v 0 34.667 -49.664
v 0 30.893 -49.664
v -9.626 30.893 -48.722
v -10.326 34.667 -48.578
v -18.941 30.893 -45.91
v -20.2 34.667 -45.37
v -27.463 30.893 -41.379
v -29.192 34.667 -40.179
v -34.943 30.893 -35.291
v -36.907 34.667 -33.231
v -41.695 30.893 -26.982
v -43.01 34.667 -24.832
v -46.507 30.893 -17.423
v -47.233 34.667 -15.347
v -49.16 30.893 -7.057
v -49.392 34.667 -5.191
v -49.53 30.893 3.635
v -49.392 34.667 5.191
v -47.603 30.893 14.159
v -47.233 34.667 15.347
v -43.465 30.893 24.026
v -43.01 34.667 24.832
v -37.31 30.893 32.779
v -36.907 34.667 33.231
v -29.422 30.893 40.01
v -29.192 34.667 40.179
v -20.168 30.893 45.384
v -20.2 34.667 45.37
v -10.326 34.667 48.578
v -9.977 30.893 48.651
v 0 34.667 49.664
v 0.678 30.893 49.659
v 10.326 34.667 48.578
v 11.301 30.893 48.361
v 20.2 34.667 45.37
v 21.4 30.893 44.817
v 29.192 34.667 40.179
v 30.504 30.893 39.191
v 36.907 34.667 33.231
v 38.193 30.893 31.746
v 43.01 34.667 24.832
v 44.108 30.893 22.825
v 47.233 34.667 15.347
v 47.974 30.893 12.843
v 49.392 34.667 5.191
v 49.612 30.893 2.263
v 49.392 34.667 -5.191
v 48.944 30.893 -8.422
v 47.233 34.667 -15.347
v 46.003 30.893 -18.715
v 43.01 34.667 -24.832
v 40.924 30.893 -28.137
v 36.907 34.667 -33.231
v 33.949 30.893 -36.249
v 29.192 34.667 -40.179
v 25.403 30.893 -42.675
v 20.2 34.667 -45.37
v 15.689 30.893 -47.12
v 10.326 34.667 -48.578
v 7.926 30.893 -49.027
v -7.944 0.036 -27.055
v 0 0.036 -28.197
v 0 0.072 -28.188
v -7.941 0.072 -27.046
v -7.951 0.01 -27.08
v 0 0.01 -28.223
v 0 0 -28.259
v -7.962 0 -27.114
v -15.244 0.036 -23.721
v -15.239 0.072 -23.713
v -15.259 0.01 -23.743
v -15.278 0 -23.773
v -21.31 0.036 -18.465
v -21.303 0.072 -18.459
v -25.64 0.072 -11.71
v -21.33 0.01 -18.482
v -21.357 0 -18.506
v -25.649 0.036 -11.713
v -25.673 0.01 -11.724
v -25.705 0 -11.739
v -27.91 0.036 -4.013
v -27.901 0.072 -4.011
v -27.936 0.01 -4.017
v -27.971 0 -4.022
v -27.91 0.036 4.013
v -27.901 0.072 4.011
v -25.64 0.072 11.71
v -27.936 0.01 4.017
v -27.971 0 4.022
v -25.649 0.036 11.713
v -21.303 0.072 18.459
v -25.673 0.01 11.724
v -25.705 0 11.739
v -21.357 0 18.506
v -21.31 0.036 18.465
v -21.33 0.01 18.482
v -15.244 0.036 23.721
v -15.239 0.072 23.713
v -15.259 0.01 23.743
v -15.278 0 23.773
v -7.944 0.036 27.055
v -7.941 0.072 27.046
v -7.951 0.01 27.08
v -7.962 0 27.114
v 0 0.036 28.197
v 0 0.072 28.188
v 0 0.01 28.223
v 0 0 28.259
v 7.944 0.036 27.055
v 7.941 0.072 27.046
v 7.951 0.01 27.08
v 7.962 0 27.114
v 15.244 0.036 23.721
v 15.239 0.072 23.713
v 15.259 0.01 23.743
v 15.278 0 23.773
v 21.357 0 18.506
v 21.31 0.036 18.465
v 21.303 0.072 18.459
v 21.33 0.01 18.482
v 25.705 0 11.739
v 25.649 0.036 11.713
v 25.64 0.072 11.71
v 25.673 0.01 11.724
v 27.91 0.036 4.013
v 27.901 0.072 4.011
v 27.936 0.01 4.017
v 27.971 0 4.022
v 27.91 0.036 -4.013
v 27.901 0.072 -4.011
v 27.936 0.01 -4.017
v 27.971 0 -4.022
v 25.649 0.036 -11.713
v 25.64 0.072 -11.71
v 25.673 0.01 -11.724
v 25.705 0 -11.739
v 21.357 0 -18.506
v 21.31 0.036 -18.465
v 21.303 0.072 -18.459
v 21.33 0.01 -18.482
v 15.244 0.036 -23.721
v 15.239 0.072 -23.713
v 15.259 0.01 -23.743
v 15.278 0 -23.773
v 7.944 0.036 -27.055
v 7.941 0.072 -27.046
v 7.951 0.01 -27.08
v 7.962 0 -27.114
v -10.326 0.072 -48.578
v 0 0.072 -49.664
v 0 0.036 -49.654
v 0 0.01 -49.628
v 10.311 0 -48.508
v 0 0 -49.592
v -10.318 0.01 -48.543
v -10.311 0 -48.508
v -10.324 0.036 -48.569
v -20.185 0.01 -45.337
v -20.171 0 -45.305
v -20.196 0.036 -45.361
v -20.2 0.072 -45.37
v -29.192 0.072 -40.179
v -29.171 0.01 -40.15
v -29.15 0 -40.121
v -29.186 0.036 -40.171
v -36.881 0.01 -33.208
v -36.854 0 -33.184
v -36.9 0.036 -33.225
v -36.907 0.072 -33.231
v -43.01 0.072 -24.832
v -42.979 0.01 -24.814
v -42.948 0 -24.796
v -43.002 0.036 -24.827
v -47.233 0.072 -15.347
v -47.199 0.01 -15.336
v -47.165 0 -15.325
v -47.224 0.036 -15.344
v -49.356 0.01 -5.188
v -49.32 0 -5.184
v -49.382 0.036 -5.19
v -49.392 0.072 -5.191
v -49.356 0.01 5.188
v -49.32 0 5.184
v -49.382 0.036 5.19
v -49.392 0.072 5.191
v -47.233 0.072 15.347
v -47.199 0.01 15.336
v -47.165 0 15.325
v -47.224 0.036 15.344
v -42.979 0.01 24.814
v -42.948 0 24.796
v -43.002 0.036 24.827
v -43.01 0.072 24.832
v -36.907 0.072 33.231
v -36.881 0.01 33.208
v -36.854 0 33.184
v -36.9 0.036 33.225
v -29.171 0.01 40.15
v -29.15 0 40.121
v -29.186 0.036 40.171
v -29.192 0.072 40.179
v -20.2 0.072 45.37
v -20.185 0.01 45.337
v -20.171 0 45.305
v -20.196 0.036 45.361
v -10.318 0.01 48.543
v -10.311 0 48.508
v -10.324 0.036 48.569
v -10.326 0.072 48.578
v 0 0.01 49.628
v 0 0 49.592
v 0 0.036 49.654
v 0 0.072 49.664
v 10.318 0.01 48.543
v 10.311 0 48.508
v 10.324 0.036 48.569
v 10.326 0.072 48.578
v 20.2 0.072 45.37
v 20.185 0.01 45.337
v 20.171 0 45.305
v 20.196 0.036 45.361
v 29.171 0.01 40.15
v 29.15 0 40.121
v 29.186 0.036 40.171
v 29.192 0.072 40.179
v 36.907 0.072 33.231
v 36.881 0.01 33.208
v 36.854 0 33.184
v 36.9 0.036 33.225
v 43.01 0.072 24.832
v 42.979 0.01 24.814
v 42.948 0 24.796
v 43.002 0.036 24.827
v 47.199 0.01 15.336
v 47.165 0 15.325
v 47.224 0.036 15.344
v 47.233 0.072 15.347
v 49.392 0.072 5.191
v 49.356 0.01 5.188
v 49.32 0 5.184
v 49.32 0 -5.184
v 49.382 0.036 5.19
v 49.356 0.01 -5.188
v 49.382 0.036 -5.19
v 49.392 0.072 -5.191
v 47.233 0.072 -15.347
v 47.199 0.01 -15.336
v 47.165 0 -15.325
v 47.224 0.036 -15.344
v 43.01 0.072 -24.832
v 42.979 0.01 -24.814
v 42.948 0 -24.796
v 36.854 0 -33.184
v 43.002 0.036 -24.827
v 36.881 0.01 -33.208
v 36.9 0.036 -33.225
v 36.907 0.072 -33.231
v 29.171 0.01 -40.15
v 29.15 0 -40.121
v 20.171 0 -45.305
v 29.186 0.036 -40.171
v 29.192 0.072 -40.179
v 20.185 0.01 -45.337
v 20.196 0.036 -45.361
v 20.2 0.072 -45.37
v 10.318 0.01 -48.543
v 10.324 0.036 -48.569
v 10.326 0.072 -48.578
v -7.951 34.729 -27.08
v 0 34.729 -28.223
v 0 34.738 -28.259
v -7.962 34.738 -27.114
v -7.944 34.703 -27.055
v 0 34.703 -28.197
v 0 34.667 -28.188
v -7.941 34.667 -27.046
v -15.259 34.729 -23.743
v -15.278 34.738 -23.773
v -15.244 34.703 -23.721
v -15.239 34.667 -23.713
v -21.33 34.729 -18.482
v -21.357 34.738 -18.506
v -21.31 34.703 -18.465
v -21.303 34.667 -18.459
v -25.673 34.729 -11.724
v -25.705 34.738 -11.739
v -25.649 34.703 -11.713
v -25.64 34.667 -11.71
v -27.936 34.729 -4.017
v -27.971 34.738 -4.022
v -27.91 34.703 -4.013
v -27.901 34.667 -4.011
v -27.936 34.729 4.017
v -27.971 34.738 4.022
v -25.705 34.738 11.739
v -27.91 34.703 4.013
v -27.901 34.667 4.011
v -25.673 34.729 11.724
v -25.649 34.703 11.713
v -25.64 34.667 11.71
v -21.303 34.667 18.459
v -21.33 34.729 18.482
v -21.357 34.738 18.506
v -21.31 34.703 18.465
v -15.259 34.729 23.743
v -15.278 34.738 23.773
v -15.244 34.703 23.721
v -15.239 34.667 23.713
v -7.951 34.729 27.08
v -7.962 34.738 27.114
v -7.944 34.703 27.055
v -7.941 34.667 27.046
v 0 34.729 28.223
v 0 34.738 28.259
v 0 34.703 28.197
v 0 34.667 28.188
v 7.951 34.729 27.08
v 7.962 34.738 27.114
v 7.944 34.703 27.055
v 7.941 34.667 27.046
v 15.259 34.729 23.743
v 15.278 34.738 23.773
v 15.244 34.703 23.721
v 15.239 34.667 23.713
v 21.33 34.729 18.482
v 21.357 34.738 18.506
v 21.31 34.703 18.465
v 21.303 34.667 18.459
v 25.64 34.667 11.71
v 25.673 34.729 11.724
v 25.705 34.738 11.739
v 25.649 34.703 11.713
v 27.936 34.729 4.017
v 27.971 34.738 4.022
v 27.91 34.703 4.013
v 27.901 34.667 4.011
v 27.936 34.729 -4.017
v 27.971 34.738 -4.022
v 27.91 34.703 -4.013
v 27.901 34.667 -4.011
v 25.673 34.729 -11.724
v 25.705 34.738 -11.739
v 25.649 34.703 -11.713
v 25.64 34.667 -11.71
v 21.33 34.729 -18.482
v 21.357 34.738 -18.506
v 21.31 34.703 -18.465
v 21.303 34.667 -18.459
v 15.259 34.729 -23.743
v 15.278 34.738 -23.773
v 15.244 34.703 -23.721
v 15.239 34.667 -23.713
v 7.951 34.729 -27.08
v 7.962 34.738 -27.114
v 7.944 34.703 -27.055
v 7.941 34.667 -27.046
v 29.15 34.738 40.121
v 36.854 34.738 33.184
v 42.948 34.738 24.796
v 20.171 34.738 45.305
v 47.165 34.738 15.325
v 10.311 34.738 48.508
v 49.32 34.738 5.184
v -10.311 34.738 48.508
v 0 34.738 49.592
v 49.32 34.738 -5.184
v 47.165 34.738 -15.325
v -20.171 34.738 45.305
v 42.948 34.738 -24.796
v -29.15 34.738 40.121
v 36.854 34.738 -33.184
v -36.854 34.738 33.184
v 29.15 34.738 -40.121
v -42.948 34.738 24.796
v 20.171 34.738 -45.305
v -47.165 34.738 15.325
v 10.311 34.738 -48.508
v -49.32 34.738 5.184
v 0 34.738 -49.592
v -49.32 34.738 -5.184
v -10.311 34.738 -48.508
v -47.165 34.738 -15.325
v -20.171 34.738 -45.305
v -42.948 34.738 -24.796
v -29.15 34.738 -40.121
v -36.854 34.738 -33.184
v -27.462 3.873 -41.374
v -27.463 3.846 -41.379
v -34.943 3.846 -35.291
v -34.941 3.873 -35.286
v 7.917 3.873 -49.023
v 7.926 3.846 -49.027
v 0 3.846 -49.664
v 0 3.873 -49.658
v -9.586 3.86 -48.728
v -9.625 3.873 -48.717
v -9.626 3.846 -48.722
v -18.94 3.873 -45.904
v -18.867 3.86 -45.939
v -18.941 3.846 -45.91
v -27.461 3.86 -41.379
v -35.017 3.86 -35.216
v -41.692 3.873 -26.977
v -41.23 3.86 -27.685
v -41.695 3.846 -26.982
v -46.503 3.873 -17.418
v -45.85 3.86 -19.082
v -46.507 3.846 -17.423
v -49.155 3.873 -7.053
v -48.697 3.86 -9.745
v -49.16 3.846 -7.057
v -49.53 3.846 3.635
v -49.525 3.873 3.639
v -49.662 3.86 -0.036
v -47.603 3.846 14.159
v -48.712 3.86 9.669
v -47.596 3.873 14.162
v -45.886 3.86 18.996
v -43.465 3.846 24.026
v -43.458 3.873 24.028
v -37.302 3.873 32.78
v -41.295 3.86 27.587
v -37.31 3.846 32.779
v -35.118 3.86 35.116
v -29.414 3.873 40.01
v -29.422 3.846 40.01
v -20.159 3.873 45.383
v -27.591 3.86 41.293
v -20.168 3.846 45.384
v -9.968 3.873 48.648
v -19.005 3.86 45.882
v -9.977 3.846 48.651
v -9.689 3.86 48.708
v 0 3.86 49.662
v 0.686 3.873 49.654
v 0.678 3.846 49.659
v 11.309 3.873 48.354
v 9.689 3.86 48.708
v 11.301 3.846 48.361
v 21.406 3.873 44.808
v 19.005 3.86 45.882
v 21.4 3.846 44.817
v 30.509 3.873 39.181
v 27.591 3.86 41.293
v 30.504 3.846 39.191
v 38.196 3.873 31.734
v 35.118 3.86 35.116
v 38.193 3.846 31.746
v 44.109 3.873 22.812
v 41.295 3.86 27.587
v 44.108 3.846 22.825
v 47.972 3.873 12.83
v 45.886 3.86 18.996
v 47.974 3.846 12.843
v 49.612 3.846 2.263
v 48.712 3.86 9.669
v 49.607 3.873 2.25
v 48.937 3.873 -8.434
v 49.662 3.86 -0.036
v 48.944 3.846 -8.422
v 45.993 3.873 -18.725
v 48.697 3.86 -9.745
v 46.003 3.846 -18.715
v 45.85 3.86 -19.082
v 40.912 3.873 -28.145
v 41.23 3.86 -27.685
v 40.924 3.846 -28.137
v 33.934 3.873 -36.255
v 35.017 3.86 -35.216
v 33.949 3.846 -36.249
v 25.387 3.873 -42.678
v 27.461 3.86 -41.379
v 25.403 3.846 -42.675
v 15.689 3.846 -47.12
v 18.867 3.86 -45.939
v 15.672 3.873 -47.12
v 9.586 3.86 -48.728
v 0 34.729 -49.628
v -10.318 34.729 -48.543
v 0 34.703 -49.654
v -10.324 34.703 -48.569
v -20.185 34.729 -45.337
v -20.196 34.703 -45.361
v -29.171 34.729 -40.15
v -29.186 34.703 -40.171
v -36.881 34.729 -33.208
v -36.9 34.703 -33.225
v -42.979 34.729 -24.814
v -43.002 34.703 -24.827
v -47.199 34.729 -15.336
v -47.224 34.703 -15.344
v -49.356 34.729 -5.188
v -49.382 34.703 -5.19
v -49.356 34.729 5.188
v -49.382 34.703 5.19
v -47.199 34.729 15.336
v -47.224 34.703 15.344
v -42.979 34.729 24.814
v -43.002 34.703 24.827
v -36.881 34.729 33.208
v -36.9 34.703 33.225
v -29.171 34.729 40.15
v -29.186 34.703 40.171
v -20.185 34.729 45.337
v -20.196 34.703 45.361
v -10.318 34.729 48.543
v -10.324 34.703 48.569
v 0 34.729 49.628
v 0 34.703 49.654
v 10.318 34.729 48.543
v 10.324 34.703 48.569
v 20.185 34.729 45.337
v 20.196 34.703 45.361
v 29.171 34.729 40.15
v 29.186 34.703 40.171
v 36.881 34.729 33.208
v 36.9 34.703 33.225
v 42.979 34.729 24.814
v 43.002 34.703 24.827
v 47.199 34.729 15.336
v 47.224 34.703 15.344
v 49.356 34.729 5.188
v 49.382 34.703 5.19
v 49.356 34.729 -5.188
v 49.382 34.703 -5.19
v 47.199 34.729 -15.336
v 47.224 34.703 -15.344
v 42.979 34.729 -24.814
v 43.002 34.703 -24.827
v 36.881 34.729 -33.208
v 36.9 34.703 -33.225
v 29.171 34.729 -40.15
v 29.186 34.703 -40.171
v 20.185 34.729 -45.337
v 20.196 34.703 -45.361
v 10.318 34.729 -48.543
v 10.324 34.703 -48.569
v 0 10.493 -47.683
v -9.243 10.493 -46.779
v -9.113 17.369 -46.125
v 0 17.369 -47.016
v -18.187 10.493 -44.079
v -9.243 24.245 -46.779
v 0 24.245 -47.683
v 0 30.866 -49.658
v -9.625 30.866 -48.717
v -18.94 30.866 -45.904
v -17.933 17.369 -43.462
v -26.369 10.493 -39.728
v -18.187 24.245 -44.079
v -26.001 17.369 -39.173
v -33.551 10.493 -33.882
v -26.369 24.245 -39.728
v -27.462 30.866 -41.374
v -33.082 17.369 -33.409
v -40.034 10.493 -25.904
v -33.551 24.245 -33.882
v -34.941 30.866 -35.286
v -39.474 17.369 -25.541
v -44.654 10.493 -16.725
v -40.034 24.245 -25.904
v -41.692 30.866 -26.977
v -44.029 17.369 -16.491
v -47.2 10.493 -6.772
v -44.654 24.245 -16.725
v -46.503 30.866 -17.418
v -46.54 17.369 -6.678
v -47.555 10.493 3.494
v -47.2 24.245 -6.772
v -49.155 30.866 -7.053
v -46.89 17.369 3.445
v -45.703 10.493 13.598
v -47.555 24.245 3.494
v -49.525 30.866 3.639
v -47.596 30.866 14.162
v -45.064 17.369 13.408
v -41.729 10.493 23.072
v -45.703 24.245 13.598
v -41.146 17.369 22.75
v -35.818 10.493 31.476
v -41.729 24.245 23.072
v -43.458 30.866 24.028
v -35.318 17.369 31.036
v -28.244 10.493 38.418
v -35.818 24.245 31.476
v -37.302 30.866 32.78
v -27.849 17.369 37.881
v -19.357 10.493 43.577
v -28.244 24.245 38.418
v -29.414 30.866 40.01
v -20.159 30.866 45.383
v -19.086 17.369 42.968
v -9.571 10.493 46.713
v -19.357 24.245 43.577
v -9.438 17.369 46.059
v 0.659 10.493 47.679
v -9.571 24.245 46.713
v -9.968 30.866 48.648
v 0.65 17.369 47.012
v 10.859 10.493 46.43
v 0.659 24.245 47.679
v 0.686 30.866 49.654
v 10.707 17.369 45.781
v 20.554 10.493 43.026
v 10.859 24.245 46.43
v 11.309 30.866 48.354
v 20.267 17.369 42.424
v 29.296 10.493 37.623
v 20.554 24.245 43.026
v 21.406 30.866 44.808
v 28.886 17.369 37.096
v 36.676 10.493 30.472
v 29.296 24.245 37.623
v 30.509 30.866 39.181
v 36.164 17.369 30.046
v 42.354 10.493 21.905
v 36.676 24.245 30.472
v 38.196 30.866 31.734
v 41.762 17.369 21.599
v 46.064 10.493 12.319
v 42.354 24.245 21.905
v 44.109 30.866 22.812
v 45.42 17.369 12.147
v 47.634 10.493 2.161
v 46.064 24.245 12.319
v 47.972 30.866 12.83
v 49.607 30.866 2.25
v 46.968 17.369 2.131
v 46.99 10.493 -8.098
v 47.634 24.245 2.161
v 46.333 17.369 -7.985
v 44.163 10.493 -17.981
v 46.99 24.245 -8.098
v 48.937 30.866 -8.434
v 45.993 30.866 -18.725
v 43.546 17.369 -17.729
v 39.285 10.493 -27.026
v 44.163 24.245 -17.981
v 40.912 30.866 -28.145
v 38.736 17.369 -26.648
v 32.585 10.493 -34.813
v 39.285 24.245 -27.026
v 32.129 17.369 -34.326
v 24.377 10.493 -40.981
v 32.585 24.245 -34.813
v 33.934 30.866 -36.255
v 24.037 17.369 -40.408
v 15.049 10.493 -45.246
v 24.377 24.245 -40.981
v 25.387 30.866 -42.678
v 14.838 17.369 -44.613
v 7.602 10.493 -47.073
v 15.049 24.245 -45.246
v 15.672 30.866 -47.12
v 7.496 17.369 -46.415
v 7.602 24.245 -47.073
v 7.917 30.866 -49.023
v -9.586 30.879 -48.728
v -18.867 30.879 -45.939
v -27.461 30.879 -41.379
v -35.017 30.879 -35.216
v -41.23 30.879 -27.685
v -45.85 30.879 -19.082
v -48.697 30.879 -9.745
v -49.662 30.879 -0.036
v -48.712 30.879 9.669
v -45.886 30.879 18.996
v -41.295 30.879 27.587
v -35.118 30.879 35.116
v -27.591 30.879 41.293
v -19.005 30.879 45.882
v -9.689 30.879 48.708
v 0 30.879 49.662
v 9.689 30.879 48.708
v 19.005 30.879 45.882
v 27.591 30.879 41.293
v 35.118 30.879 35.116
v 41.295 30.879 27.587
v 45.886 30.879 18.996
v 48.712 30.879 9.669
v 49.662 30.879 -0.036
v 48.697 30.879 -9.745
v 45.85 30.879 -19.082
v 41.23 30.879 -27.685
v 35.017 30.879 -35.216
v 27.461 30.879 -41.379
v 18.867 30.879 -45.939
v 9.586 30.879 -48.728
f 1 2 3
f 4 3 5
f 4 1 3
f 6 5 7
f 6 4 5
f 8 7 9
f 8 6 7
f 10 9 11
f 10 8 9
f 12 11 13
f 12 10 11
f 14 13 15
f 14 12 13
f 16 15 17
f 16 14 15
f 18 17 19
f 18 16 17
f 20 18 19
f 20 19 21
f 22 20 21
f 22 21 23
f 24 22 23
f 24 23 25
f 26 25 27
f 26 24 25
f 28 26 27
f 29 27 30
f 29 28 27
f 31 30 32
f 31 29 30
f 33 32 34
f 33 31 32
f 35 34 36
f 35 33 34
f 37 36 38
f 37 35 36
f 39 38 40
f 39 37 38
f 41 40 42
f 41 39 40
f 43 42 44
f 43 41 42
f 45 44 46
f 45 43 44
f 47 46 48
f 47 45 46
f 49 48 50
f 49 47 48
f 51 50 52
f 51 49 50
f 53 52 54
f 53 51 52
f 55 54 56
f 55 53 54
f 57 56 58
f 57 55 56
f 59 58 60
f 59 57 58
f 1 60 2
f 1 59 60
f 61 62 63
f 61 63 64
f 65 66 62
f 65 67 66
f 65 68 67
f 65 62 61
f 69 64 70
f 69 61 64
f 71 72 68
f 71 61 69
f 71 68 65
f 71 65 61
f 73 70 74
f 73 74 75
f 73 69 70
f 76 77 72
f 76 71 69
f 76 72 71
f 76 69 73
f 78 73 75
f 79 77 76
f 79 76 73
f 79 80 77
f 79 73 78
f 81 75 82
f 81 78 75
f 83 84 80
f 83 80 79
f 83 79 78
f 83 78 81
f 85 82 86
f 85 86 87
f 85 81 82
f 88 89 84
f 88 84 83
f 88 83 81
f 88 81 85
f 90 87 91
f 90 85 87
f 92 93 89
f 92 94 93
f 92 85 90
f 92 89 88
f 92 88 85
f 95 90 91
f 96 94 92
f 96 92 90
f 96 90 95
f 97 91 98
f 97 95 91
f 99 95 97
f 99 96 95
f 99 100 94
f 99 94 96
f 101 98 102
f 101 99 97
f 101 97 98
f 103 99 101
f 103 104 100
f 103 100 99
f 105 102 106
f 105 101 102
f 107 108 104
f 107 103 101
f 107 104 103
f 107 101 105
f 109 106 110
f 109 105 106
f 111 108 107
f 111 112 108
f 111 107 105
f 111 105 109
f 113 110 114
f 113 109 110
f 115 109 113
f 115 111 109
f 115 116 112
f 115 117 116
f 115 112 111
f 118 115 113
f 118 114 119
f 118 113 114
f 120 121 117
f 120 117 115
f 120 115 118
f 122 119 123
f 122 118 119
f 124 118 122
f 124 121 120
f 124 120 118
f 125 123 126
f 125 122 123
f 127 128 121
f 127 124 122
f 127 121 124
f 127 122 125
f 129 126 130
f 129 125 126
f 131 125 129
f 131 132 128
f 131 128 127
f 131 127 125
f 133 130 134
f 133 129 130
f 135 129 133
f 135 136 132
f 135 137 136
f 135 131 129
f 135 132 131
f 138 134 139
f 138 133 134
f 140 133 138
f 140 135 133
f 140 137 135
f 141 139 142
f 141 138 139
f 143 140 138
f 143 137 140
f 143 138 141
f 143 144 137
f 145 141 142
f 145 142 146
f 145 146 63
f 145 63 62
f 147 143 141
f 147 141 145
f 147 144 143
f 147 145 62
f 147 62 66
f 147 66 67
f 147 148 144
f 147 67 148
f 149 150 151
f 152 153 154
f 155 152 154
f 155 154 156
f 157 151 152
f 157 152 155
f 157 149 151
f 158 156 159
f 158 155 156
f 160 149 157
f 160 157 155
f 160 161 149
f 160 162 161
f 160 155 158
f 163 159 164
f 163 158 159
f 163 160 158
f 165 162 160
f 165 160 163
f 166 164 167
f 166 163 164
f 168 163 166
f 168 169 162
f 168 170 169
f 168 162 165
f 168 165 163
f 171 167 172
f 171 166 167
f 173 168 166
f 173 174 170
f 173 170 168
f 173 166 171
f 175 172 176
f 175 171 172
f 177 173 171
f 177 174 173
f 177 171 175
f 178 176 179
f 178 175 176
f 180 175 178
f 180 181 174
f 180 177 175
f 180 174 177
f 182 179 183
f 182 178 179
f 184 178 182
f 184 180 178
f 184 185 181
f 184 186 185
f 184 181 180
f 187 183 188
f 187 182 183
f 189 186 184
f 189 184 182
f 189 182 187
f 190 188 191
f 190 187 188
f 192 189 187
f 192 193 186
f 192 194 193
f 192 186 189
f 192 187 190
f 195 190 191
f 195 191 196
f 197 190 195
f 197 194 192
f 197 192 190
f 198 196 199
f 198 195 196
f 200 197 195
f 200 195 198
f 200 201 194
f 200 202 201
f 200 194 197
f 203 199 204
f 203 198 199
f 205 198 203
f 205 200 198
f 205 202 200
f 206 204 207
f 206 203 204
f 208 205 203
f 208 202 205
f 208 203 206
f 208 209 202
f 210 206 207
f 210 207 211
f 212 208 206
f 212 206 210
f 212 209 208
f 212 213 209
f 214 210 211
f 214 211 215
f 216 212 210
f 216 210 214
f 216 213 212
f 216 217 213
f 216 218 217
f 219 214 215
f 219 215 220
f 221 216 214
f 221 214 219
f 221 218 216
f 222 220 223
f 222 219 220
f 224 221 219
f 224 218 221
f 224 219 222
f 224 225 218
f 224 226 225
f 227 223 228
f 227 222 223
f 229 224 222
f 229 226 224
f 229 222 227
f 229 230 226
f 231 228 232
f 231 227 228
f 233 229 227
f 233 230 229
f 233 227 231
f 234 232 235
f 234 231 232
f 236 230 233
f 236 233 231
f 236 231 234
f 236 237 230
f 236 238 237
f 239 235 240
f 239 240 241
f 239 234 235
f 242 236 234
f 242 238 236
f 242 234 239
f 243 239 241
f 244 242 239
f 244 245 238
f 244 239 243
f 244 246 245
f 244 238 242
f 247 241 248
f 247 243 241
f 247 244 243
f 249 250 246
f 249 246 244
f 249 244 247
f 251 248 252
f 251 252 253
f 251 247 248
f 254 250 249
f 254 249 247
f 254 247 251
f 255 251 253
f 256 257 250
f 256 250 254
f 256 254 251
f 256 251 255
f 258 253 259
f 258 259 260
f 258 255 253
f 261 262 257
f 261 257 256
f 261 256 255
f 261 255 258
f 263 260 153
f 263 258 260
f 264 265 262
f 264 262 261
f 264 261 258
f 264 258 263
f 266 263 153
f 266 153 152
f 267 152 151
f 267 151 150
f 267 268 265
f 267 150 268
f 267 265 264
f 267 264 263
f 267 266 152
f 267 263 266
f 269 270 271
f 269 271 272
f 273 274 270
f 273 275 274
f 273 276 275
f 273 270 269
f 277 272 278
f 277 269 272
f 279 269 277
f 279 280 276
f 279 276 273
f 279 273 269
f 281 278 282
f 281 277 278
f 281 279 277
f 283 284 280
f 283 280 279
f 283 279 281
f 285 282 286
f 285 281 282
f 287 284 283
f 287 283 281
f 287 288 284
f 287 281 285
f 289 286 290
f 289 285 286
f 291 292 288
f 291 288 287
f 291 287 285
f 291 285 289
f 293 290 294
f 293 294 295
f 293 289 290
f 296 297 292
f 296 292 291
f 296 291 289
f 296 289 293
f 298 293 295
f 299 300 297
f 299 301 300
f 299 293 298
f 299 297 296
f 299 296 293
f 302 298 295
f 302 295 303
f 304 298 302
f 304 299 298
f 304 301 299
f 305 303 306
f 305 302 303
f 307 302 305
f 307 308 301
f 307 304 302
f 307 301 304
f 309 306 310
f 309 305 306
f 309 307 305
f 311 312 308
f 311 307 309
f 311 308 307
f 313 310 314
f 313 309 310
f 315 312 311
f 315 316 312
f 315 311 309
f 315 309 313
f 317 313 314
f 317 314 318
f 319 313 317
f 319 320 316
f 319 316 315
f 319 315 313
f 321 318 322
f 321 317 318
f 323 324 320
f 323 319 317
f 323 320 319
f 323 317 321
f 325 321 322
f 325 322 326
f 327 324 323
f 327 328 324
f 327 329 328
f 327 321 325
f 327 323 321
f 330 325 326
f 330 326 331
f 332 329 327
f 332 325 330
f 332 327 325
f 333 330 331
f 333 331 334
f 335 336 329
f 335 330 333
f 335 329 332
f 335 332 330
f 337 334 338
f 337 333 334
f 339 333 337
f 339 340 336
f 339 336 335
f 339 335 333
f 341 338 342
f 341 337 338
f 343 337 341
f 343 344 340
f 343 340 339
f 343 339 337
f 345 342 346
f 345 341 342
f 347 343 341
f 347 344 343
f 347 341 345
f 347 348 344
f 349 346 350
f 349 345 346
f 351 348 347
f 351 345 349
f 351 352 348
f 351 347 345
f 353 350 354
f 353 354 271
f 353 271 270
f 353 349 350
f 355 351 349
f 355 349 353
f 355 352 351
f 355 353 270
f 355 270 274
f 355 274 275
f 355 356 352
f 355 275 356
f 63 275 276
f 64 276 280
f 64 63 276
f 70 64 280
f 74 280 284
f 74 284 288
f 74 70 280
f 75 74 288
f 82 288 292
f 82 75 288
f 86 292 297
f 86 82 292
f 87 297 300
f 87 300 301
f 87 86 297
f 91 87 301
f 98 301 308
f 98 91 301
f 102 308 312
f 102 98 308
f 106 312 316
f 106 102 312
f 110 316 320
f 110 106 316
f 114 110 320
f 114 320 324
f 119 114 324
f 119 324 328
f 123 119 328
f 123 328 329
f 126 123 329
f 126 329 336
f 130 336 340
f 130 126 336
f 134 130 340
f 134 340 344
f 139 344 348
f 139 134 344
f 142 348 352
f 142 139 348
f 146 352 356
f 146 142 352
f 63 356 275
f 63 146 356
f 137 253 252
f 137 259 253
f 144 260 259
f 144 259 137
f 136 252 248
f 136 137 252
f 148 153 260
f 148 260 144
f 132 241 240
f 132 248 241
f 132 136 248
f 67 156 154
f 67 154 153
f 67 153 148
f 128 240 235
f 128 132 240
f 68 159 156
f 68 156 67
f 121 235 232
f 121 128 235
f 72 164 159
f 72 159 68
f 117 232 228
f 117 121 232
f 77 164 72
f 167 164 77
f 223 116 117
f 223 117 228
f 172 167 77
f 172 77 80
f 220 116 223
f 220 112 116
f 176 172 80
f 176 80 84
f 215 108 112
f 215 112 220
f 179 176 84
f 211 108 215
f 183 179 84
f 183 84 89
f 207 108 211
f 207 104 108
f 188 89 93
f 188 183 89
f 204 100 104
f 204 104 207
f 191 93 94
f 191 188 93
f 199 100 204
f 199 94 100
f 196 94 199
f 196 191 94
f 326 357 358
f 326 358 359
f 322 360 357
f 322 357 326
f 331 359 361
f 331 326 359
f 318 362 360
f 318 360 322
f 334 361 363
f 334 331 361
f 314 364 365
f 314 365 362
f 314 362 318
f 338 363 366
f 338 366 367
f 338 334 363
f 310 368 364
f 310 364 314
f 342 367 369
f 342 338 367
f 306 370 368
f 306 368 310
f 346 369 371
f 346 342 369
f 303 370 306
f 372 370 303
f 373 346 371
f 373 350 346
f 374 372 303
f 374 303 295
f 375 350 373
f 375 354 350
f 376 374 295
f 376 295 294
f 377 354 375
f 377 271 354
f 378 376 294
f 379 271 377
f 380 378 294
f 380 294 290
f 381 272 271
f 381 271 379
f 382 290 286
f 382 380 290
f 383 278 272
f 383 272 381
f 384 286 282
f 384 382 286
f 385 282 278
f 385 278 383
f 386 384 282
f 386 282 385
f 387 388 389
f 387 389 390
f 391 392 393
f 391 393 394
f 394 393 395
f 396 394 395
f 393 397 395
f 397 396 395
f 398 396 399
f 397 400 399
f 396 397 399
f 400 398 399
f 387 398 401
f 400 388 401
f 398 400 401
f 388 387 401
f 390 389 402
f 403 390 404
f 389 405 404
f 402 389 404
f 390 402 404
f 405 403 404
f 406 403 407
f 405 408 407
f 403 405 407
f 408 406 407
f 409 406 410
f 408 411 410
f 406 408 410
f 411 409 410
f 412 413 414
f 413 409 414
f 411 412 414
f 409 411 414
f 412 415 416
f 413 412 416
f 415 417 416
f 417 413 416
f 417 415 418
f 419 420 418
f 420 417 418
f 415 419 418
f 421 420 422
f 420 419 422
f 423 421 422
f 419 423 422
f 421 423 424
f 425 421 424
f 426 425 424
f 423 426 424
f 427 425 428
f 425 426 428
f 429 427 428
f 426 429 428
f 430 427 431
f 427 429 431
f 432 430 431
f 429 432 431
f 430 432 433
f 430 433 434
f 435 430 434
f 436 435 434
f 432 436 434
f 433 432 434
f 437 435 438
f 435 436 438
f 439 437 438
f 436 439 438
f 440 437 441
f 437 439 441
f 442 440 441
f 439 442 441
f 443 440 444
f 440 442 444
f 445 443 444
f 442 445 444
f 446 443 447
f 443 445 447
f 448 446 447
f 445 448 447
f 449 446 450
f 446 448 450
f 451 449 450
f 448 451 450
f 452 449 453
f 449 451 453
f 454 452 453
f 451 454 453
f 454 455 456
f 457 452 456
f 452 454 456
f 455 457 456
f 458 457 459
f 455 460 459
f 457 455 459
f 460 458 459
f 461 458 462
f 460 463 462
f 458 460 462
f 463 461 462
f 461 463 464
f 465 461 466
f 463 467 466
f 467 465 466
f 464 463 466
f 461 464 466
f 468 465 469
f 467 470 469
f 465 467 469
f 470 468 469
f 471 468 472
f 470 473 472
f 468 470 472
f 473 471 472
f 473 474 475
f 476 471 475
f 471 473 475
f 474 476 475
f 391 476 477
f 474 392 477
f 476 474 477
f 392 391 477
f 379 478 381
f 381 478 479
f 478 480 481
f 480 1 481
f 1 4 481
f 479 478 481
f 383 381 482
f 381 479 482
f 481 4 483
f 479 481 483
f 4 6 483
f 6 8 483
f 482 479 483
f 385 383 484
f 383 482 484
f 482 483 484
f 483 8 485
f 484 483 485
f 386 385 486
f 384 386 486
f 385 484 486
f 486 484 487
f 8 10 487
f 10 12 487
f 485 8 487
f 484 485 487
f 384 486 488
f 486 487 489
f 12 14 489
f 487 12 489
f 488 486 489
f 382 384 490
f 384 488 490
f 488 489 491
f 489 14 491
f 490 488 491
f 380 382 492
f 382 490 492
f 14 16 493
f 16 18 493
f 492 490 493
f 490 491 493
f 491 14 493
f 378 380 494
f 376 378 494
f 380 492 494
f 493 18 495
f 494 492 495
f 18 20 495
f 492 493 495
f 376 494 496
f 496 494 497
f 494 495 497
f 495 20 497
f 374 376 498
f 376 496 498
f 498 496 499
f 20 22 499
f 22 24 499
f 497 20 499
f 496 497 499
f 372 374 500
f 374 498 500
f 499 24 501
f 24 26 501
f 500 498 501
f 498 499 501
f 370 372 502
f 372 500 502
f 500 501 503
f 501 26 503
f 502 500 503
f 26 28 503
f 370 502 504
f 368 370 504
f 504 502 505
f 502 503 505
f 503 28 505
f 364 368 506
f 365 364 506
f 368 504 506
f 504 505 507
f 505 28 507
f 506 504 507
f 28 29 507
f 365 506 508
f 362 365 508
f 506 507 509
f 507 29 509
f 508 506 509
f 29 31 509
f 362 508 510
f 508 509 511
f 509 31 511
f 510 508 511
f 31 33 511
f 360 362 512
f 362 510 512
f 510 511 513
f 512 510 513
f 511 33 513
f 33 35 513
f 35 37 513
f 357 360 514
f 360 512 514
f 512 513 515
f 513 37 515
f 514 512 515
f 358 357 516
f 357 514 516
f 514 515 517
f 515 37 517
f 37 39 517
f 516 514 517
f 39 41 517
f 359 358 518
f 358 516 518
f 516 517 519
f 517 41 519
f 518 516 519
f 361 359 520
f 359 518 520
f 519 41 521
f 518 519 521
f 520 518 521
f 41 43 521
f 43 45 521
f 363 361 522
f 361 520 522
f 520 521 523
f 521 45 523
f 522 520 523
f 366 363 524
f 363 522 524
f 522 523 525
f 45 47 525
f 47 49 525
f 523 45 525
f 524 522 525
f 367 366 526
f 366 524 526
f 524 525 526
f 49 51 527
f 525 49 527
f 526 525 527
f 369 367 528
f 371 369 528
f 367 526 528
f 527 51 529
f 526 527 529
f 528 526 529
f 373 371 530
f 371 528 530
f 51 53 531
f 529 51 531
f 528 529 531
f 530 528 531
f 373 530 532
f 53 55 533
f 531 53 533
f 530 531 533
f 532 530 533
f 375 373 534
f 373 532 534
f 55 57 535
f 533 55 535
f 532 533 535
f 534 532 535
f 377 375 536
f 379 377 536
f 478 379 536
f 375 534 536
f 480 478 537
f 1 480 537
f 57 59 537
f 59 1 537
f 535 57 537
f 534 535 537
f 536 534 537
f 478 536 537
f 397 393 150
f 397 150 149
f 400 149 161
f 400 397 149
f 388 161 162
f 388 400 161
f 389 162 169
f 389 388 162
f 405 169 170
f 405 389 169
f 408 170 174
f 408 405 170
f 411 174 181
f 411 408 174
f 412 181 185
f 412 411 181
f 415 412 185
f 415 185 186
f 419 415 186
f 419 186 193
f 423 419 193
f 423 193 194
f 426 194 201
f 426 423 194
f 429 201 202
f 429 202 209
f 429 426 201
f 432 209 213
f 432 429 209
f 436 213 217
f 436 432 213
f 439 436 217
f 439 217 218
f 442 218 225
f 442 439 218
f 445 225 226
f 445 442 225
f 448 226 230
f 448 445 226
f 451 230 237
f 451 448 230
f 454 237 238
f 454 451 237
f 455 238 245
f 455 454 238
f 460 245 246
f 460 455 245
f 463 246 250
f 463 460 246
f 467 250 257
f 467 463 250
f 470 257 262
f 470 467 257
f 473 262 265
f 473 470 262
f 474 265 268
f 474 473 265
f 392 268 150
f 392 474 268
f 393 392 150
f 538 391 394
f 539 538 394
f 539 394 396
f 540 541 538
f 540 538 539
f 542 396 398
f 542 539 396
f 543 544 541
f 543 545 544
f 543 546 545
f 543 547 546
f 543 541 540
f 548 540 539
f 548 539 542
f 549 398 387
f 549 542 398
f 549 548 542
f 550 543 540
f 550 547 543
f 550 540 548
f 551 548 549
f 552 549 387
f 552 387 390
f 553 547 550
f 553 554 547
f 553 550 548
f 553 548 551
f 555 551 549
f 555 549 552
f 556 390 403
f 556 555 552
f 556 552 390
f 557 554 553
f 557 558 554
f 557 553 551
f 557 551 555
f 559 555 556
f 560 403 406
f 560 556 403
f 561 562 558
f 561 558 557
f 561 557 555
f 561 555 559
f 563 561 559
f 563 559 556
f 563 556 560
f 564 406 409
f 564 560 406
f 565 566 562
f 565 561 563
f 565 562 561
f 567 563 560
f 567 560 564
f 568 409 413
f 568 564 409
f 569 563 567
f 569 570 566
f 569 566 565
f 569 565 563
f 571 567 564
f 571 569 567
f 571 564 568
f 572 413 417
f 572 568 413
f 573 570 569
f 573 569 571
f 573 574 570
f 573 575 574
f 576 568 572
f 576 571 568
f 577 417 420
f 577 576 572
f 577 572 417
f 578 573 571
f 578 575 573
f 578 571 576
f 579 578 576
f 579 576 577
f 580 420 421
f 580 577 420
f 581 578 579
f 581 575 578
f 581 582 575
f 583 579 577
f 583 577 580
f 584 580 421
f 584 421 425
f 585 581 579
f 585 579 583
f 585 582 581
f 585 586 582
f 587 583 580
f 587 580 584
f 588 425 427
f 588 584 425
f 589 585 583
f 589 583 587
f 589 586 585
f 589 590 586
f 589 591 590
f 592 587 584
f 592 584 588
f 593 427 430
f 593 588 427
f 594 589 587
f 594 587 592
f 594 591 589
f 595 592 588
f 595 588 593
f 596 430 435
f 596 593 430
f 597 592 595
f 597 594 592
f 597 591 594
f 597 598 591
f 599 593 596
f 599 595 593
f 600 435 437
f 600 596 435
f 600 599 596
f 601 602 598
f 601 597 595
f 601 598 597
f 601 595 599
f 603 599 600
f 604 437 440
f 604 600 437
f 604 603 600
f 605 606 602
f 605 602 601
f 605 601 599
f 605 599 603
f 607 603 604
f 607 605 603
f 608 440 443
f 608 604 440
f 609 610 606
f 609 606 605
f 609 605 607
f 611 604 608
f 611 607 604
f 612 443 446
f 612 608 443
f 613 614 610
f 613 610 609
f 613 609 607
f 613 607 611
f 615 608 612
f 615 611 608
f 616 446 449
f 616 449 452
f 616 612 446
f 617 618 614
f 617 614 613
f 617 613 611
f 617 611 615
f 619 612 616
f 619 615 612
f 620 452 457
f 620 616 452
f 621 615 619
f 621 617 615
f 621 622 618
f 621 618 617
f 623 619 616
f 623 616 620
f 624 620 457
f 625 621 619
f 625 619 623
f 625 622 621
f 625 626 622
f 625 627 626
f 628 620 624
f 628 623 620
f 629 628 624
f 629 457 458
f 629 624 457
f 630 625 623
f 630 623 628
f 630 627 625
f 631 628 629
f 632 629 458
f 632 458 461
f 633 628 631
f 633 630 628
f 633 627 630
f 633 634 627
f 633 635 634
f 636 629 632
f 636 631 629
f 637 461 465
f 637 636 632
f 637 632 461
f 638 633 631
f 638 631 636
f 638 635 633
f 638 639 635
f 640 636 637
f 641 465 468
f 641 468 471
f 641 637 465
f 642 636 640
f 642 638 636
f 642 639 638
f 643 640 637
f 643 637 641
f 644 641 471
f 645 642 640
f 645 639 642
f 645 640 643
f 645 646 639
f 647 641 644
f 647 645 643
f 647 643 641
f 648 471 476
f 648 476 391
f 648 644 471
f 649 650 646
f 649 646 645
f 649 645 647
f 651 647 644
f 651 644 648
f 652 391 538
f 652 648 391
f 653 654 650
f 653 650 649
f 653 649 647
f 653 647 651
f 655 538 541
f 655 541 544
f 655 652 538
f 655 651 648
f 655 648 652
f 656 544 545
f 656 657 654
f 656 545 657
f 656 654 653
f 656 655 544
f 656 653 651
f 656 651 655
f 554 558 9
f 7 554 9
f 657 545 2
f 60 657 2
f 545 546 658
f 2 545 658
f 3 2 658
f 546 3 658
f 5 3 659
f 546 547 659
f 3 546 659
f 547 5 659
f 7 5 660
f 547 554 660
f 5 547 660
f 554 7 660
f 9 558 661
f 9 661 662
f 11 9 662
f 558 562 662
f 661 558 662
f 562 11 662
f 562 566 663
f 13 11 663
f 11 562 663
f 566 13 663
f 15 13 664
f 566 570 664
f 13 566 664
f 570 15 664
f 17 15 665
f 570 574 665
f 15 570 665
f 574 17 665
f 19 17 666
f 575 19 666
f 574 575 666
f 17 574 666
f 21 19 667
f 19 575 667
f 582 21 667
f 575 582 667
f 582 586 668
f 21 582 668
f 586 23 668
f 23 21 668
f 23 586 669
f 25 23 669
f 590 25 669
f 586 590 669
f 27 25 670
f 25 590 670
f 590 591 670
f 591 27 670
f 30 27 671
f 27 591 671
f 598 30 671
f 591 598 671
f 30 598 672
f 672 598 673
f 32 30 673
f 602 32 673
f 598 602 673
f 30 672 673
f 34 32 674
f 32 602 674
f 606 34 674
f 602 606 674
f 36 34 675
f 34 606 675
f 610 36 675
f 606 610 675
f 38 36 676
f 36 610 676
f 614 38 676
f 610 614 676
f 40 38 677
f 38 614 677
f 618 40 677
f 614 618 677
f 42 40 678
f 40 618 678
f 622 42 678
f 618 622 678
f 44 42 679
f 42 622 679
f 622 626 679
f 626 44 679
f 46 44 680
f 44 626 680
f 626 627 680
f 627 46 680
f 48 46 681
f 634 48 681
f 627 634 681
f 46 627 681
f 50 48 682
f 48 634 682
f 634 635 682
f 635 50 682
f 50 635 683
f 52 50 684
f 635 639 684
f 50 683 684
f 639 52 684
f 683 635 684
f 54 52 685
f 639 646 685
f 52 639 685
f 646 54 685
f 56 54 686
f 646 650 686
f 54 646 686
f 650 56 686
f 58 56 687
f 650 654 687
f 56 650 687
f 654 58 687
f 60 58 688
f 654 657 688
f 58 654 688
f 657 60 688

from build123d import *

# Parameters (mm, degrees)
FILLET1_R = 0.071587302


with BuildPart() as part:
    # Sketch1 → Revolve1 (revolve)
    with BuildSketch(Plane.XY, mode=Mode.PRIVATE) as revolve1_sk:
        with BuildLine():
            Line((49.663690476, 34.738392842), (28.1875, 34.738392842))
            Line((28.1875, 34.738392842), (28.1875, 0))
            Line((28.1875, 0), (49.663690476, 0))
            Line((49.663690476, 0), (49.663690476, 3.859821429))
            ThreePointArc((49.663690476, 3.859821429), (47.016415419, 17.369196421), (49.663690476, 30.878571413))
            Line((49.663690476, 30.878571413), (49.663690476, 34.738392842))
        make_face()
    revolve(revolve1_sk.sketch.rotate(Axis((0, 0, 0), (0, 1, 0)), 90), axis=Axis((0, 0, 0), (0, 1, 0)))

    # Fillet1
    fillet1_edges = [part.edges().sort_by_distance(p)[0] for p in [
        (0, 34.738392842, 28.1875),
        (0, 34.738392842, 49.663690476),
        (0, 30.878571413, 49.663690476),
        (0, 3.859821429, 49.663690476),
        (0, 0, 49.663690476),
        (0, 0, 28.1875),
    ]]
    fillet(fillet1_edges, radius=FILLET1_R)


solid = part.part
